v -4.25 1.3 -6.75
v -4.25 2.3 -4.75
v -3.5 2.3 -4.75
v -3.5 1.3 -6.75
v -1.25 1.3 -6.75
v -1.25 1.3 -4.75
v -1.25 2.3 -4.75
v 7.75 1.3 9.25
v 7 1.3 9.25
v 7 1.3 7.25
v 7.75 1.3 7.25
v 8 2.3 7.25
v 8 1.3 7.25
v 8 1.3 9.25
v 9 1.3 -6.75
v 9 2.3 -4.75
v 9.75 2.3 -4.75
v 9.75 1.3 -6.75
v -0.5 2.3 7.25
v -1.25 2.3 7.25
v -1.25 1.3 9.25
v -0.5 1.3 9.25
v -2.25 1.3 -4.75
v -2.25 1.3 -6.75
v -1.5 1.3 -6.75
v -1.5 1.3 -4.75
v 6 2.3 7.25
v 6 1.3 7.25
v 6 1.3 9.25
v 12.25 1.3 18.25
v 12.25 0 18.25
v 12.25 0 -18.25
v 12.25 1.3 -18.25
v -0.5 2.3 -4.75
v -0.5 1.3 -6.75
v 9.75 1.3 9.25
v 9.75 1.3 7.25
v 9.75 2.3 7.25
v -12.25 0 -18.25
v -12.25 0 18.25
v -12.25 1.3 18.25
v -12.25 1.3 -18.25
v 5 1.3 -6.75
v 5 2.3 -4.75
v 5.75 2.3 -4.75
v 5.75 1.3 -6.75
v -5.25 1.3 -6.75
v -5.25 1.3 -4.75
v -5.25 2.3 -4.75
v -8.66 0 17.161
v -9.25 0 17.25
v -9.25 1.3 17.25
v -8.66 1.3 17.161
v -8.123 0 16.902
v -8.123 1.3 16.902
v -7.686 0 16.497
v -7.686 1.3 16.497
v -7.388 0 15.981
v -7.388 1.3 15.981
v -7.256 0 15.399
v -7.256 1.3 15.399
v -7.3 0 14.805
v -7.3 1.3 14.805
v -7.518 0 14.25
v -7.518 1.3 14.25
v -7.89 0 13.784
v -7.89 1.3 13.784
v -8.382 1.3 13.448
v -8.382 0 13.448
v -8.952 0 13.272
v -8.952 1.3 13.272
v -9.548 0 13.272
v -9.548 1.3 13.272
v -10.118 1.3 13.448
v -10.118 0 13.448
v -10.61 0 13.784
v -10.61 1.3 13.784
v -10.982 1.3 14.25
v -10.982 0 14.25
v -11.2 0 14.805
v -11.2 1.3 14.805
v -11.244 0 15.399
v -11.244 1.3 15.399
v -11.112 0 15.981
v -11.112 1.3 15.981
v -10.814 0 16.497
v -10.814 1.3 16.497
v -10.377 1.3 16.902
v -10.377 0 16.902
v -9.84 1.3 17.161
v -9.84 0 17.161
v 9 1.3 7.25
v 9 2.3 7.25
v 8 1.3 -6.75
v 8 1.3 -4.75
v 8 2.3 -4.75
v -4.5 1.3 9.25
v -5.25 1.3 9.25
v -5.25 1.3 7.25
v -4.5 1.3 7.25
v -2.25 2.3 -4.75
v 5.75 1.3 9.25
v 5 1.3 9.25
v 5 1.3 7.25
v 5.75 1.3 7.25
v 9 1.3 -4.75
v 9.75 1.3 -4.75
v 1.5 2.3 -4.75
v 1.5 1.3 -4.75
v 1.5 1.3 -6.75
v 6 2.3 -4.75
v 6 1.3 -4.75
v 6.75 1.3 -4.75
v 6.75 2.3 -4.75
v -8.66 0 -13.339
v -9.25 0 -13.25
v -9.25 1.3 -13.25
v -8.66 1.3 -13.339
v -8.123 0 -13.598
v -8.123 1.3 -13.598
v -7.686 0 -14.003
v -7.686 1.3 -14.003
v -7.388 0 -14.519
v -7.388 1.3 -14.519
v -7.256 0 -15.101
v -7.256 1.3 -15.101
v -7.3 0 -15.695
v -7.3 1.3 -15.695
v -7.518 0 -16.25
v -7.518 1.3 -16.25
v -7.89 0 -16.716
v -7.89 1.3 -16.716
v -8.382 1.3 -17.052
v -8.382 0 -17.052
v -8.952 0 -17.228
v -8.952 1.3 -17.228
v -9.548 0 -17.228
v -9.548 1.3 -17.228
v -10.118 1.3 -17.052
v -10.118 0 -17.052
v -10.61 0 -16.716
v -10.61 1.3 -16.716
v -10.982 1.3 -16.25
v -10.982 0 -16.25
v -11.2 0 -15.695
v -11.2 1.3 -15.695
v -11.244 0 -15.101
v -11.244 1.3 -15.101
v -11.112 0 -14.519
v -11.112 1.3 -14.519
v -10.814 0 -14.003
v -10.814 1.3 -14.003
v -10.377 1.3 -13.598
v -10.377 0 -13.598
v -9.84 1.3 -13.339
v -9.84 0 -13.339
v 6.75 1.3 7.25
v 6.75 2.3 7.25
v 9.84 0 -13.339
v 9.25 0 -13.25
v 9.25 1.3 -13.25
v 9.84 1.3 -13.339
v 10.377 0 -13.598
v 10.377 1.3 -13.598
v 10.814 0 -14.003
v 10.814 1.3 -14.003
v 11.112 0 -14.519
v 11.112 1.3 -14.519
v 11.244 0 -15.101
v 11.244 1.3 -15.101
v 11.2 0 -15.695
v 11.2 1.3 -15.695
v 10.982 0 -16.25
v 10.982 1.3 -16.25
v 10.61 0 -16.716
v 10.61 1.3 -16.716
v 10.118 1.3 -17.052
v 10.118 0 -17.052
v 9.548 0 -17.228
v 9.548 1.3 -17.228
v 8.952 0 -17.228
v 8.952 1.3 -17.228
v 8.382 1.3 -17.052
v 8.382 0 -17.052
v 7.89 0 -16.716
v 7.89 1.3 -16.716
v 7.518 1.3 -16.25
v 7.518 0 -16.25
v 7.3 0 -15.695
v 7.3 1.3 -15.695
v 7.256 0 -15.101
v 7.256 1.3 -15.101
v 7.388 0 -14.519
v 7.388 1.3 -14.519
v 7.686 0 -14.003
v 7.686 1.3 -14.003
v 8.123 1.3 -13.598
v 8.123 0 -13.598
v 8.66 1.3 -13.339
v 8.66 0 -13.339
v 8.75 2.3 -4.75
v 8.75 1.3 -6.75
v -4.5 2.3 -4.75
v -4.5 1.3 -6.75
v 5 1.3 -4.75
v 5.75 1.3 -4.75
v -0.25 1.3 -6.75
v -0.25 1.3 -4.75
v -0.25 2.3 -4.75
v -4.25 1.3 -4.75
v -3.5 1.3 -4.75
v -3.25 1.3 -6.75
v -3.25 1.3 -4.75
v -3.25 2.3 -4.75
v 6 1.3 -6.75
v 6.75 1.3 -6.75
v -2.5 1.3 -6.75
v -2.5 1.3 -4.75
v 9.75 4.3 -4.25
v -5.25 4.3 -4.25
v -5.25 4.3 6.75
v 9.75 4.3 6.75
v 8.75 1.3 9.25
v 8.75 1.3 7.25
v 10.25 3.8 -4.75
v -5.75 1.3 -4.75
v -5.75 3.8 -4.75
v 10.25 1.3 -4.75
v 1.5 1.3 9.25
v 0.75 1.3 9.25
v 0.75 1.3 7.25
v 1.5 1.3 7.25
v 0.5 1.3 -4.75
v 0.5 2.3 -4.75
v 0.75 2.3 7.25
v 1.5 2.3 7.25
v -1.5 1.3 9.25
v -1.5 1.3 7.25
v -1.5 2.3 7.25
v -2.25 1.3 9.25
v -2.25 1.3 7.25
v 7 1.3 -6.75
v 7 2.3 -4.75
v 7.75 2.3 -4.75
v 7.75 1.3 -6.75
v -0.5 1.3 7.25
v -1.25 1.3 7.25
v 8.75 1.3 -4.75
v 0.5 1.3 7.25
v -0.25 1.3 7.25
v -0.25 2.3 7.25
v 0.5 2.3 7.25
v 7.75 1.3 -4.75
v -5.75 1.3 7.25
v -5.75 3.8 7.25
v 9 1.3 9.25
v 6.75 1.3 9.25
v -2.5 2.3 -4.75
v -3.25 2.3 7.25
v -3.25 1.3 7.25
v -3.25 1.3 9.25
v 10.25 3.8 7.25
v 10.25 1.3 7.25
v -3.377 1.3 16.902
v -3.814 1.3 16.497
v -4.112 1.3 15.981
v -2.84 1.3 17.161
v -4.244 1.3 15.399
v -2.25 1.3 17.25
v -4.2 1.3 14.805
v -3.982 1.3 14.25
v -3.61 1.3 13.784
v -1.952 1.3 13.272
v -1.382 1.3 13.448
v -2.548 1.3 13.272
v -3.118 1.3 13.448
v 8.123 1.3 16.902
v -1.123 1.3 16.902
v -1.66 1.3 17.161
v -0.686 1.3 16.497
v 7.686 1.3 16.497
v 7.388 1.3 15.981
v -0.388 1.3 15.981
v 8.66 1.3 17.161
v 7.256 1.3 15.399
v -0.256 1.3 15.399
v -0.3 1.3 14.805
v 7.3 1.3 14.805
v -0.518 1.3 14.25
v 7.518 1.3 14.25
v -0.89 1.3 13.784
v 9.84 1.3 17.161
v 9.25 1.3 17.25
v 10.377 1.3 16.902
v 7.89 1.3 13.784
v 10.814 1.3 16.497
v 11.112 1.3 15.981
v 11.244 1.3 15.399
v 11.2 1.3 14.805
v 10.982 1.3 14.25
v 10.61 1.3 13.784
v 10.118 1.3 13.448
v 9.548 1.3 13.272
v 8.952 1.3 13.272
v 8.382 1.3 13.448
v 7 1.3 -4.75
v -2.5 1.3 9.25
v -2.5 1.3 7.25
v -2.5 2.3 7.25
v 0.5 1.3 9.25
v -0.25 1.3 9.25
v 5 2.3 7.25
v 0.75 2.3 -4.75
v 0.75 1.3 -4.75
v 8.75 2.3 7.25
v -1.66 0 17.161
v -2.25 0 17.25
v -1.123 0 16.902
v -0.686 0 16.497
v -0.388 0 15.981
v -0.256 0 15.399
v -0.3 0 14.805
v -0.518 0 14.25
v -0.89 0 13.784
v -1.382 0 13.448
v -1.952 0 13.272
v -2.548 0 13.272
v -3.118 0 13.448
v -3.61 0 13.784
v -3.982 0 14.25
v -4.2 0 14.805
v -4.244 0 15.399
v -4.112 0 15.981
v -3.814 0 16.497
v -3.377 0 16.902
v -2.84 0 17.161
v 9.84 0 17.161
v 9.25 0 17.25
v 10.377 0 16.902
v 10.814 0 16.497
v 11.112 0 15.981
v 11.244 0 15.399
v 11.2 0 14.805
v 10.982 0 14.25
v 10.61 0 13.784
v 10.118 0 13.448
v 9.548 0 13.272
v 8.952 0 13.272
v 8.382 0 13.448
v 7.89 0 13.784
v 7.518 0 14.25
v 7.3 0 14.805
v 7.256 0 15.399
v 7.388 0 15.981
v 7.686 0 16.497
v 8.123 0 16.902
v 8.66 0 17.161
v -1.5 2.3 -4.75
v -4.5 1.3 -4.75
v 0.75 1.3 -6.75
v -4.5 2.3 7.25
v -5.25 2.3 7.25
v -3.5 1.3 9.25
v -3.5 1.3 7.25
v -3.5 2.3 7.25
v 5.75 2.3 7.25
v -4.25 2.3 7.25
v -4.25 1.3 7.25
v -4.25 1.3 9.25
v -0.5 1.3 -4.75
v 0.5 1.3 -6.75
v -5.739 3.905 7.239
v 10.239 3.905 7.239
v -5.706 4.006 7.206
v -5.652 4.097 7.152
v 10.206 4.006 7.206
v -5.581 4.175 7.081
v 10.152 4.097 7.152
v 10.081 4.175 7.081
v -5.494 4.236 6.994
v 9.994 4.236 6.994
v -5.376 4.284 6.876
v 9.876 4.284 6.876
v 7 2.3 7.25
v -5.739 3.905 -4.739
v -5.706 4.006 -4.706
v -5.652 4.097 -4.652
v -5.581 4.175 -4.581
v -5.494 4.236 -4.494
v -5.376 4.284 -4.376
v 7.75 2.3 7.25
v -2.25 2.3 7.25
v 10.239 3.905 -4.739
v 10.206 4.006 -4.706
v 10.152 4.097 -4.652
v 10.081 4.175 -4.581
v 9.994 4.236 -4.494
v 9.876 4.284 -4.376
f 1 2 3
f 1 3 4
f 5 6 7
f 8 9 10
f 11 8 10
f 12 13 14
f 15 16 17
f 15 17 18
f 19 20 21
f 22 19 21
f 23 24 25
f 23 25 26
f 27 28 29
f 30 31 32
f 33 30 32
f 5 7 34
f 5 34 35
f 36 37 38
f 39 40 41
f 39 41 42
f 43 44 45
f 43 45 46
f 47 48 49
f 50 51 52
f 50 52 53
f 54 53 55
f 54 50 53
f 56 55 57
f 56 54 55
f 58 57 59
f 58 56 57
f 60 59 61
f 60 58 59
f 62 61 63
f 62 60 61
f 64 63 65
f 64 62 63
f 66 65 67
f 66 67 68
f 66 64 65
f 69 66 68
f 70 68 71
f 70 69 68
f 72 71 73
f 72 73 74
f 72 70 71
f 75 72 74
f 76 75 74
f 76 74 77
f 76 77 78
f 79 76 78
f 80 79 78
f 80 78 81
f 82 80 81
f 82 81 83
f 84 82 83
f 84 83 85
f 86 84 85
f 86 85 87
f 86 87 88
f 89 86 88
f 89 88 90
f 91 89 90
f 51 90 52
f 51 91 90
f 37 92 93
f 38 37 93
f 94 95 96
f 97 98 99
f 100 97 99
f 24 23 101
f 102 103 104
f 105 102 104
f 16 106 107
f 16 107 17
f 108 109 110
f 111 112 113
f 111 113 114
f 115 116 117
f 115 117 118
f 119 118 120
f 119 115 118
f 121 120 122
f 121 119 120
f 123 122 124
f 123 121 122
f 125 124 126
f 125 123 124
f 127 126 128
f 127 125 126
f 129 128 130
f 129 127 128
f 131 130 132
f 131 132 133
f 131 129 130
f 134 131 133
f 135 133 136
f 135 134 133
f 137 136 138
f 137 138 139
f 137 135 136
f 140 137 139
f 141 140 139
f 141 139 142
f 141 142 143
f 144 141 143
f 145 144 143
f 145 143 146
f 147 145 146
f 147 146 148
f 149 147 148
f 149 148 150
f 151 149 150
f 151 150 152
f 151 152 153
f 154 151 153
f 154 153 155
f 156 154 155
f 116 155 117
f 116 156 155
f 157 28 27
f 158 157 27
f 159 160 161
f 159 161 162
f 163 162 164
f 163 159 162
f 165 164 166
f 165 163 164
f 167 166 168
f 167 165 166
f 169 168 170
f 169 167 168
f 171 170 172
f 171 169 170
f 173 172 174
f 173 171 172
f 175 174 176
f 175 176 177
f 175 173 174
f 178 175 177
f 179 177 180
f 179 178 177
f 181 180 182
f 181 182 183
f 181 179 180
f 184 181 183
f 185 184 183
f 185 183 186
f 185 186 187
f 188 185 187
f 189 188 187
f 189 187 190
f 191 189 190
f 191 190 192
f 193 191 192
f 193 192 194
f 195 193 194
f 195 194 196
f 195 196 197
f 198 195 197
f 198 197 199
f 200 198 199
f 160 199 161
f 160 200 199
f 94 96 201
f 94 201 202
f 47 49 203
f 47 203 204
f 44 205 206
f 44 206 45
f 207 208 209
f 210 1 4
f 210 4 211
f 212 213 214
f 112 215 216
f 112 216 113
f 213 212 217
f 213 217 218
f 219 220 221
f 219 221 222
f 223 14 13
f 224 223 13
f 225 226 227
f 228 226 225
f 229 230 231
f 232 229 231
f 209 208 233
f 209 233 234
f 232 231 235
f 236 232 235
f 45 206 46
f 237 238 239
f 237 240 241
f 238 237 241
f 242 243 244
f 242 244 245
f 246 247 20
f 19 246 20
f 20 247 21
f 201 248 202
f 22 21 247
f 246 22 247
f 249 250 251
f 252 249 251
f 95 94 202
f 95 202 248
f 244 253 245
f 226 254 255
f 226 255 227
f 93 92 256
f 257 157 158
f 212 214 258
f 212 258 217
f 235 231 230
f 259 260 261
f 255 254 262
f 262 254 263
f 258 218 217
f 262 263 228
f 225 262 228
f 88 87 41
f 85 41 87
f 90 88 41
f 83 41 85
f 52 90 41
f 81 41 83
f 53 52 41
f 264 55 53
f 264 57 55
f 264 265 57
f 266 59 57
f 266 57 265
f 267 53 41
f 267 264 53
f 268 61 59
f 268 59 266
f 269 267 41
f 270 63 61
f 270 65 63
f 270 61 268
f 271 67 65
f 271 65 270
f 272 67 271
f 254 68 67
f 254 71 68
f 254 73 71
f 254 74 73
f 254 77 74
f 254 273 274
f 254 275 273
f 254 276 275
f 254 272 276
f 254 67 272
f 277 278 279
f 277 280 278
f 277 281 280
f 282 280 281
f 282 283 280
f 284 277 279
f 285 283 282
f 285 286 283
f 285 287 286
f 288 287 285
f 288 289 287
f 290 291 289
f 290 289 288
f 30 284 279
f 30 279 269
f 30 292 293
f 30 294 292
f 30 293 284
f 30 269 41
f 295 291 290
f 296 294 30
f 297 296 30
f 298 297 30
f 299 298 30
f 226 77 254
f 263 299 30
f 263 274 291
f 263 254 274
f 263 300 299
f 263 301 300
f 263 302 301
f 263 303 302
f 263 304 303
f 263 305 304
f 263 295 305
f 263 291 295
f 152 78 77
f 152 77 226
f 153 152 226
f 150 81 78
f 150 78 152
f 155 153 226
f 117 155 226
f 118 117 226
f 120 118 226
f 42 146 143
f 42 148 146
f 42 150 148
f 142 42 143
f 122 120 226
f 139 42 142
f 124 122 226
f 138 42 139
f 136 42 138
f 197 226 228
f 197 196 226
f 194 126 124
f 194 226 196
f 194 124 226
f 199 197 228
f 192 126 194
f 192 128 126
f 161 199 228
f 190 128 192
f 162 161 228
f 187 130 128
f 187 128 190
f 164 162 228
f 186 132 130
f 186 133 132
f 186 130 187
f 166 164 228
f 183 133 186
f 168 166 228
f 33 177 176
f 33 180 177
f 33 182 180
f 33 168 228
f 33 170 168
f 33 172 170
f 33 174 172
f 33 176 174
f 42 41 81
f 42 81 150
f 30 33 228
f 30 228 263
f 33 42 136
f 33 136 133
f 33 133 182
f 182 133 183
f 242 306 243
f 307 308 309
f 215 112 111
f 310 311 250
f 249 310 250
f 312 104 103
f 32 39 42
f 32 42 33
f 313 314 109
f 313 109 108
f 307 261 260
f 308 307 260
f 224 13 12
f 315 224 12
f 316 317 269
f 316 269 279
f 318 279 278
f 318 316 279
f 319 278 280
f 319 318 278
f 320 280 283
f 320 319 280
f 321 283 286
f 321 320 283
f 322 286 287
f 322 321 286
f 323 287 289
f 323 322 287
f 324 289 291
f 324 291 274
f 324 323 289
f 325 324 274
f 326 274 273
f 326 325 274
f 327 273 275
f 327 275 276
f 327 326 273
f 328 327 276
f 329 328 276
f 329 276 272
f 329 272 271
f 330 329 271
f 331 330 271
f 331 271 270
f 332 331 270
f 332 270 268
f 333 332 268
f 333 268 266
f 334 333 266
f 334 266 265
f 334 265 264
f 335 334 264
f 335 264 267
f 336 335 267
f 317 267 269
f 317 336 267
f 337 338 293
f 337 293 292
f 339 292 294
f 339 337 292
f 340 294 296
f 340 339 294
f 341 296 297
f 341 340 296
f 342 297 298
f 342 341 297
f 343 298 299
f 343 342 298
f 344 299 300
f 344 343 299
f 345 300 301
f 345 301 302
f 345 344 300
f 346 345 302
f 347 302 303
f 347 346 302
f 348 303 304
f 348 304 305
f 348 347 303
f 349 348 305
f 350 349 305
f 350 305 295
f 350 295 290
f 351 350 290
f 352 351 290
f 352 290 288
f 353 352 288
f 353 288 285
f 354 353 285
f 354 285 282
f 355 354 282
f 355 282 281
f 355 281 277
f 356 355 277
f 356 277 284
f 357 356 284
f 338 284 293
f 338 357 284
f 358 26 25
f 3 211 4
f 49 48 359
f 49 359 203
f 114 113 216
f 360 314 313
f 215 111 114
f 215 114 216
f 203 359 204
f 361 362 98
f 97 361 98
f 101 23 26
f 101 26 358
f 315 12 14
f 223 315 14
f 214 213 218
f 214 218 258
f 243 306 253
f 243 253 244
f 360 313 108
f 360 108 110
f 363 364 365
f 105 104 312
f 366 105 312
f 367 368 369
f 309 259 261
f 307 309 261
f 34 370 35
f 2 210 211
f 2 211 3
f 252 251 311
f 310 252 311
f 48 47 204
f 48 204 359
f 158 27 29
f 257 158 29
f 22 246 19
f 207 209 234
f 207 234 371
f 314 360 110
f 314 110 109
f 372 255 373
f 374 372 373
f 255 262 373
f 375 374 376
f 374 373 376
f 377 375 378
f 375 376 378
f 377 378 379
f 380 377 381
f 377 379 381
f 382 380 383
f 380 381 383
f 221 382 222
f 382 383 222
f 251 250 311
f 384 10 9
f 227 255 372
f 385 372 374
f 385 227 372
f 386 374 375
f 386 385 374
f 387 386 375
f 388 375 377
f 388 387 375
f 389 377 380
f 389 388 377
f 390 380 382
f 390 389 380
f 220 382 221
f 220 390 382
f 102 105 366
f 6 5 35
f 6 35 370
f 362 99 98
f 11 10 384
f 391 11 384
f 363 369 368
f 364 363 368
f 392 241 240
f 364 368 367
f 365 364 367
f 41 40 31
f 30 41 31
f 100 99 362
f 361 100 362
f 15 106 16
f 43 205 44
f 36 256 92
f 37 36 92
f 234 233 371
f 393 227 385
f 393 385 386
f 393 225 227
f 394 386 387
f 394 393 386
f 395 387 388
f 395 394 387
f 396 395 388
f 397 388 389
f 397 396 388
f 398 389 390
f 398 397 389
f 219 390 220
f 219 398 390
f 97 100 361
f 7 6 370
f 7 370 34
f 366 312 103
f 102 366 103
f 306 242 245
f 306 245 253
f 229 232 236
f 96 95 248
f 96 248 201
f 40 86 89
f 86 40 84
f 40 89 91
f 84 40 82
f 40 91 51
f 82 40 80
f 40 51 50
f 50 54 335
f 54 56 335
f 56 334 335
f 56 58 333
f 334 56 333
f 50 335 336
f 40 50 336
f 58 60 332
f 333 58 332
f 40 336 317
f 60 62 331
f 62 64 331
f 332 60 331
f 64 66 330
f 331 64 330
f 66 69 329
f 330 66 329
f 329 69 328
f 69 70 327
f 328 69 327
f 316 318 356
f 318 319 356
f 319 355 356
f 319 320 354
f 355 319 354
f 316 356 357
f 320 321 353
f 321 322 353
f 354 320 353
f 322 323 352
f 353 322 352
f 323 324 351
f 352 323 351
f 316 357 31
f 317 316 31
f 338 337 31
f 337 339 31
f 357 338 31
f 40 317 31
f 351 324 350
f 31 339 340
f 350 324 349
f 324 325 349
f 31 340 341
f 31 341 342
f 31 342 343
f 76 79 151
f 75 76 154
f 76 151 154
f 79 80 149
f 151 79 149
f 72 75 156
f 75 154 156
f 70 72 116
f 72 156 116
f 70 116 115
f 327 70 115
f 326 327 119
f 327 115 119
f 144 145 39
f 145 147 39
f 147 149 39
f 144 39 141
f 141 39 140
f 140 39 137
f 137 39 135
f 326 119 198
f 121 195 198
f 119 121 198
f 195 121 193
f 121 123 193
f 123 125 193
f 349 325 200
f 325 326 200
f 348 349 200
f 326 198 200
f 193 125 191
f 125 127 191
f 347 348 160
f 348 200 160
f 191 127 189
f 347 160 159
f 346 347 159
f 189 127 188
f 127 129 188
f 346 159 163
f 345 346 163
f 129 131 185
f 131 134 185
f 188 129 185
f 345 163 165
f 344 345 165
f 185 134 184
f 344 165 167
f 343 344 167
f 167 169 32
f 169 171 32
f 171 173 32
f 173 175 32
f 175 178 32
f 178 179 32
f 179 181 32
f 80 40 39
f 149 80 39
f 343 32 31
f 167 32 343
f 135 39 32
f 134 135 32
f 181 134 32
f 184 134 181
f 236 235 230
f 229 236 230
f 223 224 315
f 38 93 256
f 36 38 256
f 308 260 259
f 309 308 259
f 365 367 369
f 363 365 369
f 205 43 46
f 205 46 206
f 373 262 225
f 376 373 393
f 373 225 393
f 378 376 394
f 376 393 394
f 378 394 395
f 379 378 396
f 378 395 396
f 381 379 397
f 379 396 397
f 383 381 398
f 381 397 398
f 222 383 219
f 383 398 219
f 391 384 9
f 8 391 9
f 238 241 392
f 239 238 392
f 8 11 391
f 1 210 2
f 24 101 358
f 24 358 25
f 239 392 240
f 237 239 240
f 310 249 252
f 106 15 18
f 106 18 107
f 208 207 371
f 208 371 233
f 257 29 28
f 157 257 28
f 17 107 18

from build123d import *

# Parameters (mm, degrees)
CROQUIS1_W              = 24.5
CROQUIS1_H              = 36.5
CROQUIS1_R              = 2
SALIENTE_EXTRUIR1_DEPTH = 1.3
CROQUIS2_W              = 16
CROQUIS2_H              = 12
SALIENTE_EXTRUIR2_DEPTH = 3
REDONDEO1_R             = 0.5
CARTELA1_START          = 9
CARTELA1_DEPTH          = 0.75
MATRIZL5_COUNT          = 5
MATRIZL5_PITCH          = 1
CARTELA2_START          = -5.25
CARTELA2_DEPTH          = 0.75
MATRIZL6_COUNT          = 7
MATRIZL6_PITCH          = 1


# Read off the part's stored shape, not the designer's step: Cartela1, Cartela2
with BuildPart() as part:
    # Croquis1 → Saliente-Extruir1 (new body)
    with BuildSketch(Plane(origin=(0, 0, 0), x_dir=(1, 0, 0), z_dir=(0, 1, 0))):
        Rectangle(CROQUIS1_W, CROQUIS1_H)
        with Locations(Location((-9.25, 15.25, 0), (0, 0, 270))):
            Circle(CROQUIS1_R, mode=Mode.SUBTRACT)
        with Locations(Location((9.25, 15.25, 0), (0, 0, 270))):
            Circle(CROQUIS1_R, mode=Mode.SUBTRACT)
        with Locations(Location((9.25, -15.25, 0), (0, 0, 270))):
            Circle(CROQUIS1_R, mode=Mode.SUBTRACT)
        with Locations(Location((-9.25, -15.25, 0), (0, 0, 270))):
            Circle(CROQUIS1_R, mode=Mode.SUBTRACT)
        with Locations(Location((-2.25, -15.25, 0), (0, 0, 270))):
            Circle(CROQUIS1_R, mode=Mode.SUBTRACT)
    extrude(amount=SALIENTE_EXTRUIR1_DEPTH)

    # Croquis2 → Saliente-Extruir2 (add)
    with BuildSketch(Plane(origin=(0, 1.3, 0), x_dir=(1, 0, 0), z_dir=(0, 1, 0))):
        with Locations((2.25, -1.25)):
            Rectangle(CROQUIS2_W, CROQUIS2_H)
    extrude(amount=SALIENTE_EXTRUIR2_DEPTH)

    # Redondeo1
    redondeo1_edges = [part.edges().sort_by_distance(p)[0] for p in [
        (-5.75, 4.3, 1.25),
        (2.25, 4.3, 7.25),
        (10.25, 4.3, 1.25),
        (2.25, 4.3, -4.75),
    ]]
    fillet(redondeo1_edges, radius=REDONDEO1_R)


with BuildPart() as body_2:
    # Cartela1 outline → Cartela1 (new body)
    with BuildSketch(Plane.YZ.offset(CARTELA1_START)):
        Polygon((2.3, 7.25), (1.3, 9.25), (1.3, 7.25), align=None)
    extrude(amount=CARTELA1_DEPTH)


with BuildPart() as matrizl5_1:
    # MatrizL5: pattern copy
    add(body_2.part.moved(Location(Vector(-1, 0, 0) * (1 * MATRIZL5_PITCH))))


with BuildPart() as matrizl5_2:
    # MatrizL5: pattern copy
    add(body_2.part.moved(Location(Vector(-1, 0, 0) * (2 * MATRIZL5_PITCH))))


with BuildPart() as matrizl5_3:
    # MatrizL5: pattern copy
    add(body_2.part.moved(Location(Vector(-1, 0, 0) * (3 * MATRIZL5_PITCH))))


with BuildPart() as matrizl5_4:
    # MatrizL5: pattern copy
    add(body_2.part.moved(Location(Vector(-1, 0, 0) * (4 * MATRIZL5_PITCH))))


with BuildPart() as body_7:
    # Cartela2 outline → Cartela2 (new body)
    with BuildSketch(Plane.YZ.offset(CARTELA2_START)):
        Polygon((2.3, 7.25), (1.3, 9.25), (1.3, 7.25), align=None)
    extrude(amount=CARTELA2_DEPTH)


with BuildPart() as matrizl6_1:
    # MatrizL6: pattern copy
    add(body_7.part.moved(Location(Vector(1, 0, 0) * (1 * MATRIZL6_PITCH))))


with BuildPart() as matrizl6_2:
    # MatrizL6: pattern copy
    add(body_7.part.moved(Location(Vector(1, 0, 0) * (2 * MATRIZL6_PITCH))))


with BuildPart() as matrizl6_3:
    # MatrizL6: pattern copy
    add(body_7.part.moved(Location(Vector(1, 0, 0) * (3 * MATRIZL6_PITCH))))


with BuildPart() as matrizl6_4:
    # MatrizL6: pattern copy
    add(body_7.part.moved(Location(Vector(1, 0, 0) * (4 * MATRIZL6_PITCH))))


with BuildPart() as matrizl6_5:
    # MatrizL6: pattern copy
    add(body_7.part.moved(Location(Vector(1, 0, 0) * (5 * MATRIZL6_PITCH))))


with BuildPart() as matrizl6_6:
    # MatrizL6: pattern copy
    add(body_7.part.moved(Location(Vector(1, 0, 0) * (6 * MATRIZL6_PITCH))))


with BuildPart() as body_14:
    # Simetría1: mirrored copy
    add(body_7.part.mirror(Plane.XY.offset(1.25)))


with BuildPart() as body_15:
    # Simetr_a1 2: mirrored copy
    add(matrizl6_1.part.mirror(Plane.XY.offset(1.25)))


with BuildPart() as body_16:
    # Simetr_a1 3: mirrored copy
    add(matrizl6_2.part.mirror(Plane.XY.offset(1.25)))


with BuildPart() as body_17:
    # Simetr_a1 4: mirrored copy
    add(matrizl6_3.part.mirror(Plane.XY.offset(1.25)))


with BuildPart() as body_18:
    # Simetr_a1 5: mirrored copy
    add(matrizl6_4.part.mirror(Plane.XY.offset(1.25)))


with BuildPart() as body_19:
    # Simetr_a1 6: mirrored copy
    add(matrizl6_5.part.mirror(Plane.XY.offset(1.25)))


with BuildPart() as body_20:
    # Simetr_a1 7: mirrored copy
    add(matrizl6_6.part.mirror(Plane.XY.offset(1.25)))


with BuildPart() as body_21:
    # Simetr_a1 8: mirrored copy
    add(matrizl5_4.part.mirror(Plane.XY.offset(1.25)))


with BuildPart() as body_22:
    # Simetr_a1 9: mirrored copy
    add(matrizl5_3.part.mirror(Plane.XY.offset(1.25)))


with BuildPart() as body_23:
    # Simetr_a1 10: mirrored copy
    add(matrizl5_1.part.mirror(Plane.XY.offset(1.25)))


with BuildPart() as body_24:
    # Simetr_a1 11: mirrored copy
    add(matrizl5_2.part.mirror(Plane.XY.offset(1.25)))


with BuildPart() as body_25:
    # Simetr_a1 12: mirrored copy
    add(body_2.part.mirror(Plane.XY.offset(1.25)))


solid = Compound([part.part, body_2.part, matrizl5_1.part, matrizl5_2.part, matrizl5_3.part, matrizl5_4.part, body_7.part, matrizl6_1.part, matrizl6_2.part, matrizl6_3.part, matrizl6_4.part, matrizl6_5.part, matrizl6_6.part, body_14.part, body_15.part, body_16.part, body_17.part, body_18.part, body_19.part, body_20.part, body_21.part, body_22.part, body_23.part, body_24.part, body_25.part])
